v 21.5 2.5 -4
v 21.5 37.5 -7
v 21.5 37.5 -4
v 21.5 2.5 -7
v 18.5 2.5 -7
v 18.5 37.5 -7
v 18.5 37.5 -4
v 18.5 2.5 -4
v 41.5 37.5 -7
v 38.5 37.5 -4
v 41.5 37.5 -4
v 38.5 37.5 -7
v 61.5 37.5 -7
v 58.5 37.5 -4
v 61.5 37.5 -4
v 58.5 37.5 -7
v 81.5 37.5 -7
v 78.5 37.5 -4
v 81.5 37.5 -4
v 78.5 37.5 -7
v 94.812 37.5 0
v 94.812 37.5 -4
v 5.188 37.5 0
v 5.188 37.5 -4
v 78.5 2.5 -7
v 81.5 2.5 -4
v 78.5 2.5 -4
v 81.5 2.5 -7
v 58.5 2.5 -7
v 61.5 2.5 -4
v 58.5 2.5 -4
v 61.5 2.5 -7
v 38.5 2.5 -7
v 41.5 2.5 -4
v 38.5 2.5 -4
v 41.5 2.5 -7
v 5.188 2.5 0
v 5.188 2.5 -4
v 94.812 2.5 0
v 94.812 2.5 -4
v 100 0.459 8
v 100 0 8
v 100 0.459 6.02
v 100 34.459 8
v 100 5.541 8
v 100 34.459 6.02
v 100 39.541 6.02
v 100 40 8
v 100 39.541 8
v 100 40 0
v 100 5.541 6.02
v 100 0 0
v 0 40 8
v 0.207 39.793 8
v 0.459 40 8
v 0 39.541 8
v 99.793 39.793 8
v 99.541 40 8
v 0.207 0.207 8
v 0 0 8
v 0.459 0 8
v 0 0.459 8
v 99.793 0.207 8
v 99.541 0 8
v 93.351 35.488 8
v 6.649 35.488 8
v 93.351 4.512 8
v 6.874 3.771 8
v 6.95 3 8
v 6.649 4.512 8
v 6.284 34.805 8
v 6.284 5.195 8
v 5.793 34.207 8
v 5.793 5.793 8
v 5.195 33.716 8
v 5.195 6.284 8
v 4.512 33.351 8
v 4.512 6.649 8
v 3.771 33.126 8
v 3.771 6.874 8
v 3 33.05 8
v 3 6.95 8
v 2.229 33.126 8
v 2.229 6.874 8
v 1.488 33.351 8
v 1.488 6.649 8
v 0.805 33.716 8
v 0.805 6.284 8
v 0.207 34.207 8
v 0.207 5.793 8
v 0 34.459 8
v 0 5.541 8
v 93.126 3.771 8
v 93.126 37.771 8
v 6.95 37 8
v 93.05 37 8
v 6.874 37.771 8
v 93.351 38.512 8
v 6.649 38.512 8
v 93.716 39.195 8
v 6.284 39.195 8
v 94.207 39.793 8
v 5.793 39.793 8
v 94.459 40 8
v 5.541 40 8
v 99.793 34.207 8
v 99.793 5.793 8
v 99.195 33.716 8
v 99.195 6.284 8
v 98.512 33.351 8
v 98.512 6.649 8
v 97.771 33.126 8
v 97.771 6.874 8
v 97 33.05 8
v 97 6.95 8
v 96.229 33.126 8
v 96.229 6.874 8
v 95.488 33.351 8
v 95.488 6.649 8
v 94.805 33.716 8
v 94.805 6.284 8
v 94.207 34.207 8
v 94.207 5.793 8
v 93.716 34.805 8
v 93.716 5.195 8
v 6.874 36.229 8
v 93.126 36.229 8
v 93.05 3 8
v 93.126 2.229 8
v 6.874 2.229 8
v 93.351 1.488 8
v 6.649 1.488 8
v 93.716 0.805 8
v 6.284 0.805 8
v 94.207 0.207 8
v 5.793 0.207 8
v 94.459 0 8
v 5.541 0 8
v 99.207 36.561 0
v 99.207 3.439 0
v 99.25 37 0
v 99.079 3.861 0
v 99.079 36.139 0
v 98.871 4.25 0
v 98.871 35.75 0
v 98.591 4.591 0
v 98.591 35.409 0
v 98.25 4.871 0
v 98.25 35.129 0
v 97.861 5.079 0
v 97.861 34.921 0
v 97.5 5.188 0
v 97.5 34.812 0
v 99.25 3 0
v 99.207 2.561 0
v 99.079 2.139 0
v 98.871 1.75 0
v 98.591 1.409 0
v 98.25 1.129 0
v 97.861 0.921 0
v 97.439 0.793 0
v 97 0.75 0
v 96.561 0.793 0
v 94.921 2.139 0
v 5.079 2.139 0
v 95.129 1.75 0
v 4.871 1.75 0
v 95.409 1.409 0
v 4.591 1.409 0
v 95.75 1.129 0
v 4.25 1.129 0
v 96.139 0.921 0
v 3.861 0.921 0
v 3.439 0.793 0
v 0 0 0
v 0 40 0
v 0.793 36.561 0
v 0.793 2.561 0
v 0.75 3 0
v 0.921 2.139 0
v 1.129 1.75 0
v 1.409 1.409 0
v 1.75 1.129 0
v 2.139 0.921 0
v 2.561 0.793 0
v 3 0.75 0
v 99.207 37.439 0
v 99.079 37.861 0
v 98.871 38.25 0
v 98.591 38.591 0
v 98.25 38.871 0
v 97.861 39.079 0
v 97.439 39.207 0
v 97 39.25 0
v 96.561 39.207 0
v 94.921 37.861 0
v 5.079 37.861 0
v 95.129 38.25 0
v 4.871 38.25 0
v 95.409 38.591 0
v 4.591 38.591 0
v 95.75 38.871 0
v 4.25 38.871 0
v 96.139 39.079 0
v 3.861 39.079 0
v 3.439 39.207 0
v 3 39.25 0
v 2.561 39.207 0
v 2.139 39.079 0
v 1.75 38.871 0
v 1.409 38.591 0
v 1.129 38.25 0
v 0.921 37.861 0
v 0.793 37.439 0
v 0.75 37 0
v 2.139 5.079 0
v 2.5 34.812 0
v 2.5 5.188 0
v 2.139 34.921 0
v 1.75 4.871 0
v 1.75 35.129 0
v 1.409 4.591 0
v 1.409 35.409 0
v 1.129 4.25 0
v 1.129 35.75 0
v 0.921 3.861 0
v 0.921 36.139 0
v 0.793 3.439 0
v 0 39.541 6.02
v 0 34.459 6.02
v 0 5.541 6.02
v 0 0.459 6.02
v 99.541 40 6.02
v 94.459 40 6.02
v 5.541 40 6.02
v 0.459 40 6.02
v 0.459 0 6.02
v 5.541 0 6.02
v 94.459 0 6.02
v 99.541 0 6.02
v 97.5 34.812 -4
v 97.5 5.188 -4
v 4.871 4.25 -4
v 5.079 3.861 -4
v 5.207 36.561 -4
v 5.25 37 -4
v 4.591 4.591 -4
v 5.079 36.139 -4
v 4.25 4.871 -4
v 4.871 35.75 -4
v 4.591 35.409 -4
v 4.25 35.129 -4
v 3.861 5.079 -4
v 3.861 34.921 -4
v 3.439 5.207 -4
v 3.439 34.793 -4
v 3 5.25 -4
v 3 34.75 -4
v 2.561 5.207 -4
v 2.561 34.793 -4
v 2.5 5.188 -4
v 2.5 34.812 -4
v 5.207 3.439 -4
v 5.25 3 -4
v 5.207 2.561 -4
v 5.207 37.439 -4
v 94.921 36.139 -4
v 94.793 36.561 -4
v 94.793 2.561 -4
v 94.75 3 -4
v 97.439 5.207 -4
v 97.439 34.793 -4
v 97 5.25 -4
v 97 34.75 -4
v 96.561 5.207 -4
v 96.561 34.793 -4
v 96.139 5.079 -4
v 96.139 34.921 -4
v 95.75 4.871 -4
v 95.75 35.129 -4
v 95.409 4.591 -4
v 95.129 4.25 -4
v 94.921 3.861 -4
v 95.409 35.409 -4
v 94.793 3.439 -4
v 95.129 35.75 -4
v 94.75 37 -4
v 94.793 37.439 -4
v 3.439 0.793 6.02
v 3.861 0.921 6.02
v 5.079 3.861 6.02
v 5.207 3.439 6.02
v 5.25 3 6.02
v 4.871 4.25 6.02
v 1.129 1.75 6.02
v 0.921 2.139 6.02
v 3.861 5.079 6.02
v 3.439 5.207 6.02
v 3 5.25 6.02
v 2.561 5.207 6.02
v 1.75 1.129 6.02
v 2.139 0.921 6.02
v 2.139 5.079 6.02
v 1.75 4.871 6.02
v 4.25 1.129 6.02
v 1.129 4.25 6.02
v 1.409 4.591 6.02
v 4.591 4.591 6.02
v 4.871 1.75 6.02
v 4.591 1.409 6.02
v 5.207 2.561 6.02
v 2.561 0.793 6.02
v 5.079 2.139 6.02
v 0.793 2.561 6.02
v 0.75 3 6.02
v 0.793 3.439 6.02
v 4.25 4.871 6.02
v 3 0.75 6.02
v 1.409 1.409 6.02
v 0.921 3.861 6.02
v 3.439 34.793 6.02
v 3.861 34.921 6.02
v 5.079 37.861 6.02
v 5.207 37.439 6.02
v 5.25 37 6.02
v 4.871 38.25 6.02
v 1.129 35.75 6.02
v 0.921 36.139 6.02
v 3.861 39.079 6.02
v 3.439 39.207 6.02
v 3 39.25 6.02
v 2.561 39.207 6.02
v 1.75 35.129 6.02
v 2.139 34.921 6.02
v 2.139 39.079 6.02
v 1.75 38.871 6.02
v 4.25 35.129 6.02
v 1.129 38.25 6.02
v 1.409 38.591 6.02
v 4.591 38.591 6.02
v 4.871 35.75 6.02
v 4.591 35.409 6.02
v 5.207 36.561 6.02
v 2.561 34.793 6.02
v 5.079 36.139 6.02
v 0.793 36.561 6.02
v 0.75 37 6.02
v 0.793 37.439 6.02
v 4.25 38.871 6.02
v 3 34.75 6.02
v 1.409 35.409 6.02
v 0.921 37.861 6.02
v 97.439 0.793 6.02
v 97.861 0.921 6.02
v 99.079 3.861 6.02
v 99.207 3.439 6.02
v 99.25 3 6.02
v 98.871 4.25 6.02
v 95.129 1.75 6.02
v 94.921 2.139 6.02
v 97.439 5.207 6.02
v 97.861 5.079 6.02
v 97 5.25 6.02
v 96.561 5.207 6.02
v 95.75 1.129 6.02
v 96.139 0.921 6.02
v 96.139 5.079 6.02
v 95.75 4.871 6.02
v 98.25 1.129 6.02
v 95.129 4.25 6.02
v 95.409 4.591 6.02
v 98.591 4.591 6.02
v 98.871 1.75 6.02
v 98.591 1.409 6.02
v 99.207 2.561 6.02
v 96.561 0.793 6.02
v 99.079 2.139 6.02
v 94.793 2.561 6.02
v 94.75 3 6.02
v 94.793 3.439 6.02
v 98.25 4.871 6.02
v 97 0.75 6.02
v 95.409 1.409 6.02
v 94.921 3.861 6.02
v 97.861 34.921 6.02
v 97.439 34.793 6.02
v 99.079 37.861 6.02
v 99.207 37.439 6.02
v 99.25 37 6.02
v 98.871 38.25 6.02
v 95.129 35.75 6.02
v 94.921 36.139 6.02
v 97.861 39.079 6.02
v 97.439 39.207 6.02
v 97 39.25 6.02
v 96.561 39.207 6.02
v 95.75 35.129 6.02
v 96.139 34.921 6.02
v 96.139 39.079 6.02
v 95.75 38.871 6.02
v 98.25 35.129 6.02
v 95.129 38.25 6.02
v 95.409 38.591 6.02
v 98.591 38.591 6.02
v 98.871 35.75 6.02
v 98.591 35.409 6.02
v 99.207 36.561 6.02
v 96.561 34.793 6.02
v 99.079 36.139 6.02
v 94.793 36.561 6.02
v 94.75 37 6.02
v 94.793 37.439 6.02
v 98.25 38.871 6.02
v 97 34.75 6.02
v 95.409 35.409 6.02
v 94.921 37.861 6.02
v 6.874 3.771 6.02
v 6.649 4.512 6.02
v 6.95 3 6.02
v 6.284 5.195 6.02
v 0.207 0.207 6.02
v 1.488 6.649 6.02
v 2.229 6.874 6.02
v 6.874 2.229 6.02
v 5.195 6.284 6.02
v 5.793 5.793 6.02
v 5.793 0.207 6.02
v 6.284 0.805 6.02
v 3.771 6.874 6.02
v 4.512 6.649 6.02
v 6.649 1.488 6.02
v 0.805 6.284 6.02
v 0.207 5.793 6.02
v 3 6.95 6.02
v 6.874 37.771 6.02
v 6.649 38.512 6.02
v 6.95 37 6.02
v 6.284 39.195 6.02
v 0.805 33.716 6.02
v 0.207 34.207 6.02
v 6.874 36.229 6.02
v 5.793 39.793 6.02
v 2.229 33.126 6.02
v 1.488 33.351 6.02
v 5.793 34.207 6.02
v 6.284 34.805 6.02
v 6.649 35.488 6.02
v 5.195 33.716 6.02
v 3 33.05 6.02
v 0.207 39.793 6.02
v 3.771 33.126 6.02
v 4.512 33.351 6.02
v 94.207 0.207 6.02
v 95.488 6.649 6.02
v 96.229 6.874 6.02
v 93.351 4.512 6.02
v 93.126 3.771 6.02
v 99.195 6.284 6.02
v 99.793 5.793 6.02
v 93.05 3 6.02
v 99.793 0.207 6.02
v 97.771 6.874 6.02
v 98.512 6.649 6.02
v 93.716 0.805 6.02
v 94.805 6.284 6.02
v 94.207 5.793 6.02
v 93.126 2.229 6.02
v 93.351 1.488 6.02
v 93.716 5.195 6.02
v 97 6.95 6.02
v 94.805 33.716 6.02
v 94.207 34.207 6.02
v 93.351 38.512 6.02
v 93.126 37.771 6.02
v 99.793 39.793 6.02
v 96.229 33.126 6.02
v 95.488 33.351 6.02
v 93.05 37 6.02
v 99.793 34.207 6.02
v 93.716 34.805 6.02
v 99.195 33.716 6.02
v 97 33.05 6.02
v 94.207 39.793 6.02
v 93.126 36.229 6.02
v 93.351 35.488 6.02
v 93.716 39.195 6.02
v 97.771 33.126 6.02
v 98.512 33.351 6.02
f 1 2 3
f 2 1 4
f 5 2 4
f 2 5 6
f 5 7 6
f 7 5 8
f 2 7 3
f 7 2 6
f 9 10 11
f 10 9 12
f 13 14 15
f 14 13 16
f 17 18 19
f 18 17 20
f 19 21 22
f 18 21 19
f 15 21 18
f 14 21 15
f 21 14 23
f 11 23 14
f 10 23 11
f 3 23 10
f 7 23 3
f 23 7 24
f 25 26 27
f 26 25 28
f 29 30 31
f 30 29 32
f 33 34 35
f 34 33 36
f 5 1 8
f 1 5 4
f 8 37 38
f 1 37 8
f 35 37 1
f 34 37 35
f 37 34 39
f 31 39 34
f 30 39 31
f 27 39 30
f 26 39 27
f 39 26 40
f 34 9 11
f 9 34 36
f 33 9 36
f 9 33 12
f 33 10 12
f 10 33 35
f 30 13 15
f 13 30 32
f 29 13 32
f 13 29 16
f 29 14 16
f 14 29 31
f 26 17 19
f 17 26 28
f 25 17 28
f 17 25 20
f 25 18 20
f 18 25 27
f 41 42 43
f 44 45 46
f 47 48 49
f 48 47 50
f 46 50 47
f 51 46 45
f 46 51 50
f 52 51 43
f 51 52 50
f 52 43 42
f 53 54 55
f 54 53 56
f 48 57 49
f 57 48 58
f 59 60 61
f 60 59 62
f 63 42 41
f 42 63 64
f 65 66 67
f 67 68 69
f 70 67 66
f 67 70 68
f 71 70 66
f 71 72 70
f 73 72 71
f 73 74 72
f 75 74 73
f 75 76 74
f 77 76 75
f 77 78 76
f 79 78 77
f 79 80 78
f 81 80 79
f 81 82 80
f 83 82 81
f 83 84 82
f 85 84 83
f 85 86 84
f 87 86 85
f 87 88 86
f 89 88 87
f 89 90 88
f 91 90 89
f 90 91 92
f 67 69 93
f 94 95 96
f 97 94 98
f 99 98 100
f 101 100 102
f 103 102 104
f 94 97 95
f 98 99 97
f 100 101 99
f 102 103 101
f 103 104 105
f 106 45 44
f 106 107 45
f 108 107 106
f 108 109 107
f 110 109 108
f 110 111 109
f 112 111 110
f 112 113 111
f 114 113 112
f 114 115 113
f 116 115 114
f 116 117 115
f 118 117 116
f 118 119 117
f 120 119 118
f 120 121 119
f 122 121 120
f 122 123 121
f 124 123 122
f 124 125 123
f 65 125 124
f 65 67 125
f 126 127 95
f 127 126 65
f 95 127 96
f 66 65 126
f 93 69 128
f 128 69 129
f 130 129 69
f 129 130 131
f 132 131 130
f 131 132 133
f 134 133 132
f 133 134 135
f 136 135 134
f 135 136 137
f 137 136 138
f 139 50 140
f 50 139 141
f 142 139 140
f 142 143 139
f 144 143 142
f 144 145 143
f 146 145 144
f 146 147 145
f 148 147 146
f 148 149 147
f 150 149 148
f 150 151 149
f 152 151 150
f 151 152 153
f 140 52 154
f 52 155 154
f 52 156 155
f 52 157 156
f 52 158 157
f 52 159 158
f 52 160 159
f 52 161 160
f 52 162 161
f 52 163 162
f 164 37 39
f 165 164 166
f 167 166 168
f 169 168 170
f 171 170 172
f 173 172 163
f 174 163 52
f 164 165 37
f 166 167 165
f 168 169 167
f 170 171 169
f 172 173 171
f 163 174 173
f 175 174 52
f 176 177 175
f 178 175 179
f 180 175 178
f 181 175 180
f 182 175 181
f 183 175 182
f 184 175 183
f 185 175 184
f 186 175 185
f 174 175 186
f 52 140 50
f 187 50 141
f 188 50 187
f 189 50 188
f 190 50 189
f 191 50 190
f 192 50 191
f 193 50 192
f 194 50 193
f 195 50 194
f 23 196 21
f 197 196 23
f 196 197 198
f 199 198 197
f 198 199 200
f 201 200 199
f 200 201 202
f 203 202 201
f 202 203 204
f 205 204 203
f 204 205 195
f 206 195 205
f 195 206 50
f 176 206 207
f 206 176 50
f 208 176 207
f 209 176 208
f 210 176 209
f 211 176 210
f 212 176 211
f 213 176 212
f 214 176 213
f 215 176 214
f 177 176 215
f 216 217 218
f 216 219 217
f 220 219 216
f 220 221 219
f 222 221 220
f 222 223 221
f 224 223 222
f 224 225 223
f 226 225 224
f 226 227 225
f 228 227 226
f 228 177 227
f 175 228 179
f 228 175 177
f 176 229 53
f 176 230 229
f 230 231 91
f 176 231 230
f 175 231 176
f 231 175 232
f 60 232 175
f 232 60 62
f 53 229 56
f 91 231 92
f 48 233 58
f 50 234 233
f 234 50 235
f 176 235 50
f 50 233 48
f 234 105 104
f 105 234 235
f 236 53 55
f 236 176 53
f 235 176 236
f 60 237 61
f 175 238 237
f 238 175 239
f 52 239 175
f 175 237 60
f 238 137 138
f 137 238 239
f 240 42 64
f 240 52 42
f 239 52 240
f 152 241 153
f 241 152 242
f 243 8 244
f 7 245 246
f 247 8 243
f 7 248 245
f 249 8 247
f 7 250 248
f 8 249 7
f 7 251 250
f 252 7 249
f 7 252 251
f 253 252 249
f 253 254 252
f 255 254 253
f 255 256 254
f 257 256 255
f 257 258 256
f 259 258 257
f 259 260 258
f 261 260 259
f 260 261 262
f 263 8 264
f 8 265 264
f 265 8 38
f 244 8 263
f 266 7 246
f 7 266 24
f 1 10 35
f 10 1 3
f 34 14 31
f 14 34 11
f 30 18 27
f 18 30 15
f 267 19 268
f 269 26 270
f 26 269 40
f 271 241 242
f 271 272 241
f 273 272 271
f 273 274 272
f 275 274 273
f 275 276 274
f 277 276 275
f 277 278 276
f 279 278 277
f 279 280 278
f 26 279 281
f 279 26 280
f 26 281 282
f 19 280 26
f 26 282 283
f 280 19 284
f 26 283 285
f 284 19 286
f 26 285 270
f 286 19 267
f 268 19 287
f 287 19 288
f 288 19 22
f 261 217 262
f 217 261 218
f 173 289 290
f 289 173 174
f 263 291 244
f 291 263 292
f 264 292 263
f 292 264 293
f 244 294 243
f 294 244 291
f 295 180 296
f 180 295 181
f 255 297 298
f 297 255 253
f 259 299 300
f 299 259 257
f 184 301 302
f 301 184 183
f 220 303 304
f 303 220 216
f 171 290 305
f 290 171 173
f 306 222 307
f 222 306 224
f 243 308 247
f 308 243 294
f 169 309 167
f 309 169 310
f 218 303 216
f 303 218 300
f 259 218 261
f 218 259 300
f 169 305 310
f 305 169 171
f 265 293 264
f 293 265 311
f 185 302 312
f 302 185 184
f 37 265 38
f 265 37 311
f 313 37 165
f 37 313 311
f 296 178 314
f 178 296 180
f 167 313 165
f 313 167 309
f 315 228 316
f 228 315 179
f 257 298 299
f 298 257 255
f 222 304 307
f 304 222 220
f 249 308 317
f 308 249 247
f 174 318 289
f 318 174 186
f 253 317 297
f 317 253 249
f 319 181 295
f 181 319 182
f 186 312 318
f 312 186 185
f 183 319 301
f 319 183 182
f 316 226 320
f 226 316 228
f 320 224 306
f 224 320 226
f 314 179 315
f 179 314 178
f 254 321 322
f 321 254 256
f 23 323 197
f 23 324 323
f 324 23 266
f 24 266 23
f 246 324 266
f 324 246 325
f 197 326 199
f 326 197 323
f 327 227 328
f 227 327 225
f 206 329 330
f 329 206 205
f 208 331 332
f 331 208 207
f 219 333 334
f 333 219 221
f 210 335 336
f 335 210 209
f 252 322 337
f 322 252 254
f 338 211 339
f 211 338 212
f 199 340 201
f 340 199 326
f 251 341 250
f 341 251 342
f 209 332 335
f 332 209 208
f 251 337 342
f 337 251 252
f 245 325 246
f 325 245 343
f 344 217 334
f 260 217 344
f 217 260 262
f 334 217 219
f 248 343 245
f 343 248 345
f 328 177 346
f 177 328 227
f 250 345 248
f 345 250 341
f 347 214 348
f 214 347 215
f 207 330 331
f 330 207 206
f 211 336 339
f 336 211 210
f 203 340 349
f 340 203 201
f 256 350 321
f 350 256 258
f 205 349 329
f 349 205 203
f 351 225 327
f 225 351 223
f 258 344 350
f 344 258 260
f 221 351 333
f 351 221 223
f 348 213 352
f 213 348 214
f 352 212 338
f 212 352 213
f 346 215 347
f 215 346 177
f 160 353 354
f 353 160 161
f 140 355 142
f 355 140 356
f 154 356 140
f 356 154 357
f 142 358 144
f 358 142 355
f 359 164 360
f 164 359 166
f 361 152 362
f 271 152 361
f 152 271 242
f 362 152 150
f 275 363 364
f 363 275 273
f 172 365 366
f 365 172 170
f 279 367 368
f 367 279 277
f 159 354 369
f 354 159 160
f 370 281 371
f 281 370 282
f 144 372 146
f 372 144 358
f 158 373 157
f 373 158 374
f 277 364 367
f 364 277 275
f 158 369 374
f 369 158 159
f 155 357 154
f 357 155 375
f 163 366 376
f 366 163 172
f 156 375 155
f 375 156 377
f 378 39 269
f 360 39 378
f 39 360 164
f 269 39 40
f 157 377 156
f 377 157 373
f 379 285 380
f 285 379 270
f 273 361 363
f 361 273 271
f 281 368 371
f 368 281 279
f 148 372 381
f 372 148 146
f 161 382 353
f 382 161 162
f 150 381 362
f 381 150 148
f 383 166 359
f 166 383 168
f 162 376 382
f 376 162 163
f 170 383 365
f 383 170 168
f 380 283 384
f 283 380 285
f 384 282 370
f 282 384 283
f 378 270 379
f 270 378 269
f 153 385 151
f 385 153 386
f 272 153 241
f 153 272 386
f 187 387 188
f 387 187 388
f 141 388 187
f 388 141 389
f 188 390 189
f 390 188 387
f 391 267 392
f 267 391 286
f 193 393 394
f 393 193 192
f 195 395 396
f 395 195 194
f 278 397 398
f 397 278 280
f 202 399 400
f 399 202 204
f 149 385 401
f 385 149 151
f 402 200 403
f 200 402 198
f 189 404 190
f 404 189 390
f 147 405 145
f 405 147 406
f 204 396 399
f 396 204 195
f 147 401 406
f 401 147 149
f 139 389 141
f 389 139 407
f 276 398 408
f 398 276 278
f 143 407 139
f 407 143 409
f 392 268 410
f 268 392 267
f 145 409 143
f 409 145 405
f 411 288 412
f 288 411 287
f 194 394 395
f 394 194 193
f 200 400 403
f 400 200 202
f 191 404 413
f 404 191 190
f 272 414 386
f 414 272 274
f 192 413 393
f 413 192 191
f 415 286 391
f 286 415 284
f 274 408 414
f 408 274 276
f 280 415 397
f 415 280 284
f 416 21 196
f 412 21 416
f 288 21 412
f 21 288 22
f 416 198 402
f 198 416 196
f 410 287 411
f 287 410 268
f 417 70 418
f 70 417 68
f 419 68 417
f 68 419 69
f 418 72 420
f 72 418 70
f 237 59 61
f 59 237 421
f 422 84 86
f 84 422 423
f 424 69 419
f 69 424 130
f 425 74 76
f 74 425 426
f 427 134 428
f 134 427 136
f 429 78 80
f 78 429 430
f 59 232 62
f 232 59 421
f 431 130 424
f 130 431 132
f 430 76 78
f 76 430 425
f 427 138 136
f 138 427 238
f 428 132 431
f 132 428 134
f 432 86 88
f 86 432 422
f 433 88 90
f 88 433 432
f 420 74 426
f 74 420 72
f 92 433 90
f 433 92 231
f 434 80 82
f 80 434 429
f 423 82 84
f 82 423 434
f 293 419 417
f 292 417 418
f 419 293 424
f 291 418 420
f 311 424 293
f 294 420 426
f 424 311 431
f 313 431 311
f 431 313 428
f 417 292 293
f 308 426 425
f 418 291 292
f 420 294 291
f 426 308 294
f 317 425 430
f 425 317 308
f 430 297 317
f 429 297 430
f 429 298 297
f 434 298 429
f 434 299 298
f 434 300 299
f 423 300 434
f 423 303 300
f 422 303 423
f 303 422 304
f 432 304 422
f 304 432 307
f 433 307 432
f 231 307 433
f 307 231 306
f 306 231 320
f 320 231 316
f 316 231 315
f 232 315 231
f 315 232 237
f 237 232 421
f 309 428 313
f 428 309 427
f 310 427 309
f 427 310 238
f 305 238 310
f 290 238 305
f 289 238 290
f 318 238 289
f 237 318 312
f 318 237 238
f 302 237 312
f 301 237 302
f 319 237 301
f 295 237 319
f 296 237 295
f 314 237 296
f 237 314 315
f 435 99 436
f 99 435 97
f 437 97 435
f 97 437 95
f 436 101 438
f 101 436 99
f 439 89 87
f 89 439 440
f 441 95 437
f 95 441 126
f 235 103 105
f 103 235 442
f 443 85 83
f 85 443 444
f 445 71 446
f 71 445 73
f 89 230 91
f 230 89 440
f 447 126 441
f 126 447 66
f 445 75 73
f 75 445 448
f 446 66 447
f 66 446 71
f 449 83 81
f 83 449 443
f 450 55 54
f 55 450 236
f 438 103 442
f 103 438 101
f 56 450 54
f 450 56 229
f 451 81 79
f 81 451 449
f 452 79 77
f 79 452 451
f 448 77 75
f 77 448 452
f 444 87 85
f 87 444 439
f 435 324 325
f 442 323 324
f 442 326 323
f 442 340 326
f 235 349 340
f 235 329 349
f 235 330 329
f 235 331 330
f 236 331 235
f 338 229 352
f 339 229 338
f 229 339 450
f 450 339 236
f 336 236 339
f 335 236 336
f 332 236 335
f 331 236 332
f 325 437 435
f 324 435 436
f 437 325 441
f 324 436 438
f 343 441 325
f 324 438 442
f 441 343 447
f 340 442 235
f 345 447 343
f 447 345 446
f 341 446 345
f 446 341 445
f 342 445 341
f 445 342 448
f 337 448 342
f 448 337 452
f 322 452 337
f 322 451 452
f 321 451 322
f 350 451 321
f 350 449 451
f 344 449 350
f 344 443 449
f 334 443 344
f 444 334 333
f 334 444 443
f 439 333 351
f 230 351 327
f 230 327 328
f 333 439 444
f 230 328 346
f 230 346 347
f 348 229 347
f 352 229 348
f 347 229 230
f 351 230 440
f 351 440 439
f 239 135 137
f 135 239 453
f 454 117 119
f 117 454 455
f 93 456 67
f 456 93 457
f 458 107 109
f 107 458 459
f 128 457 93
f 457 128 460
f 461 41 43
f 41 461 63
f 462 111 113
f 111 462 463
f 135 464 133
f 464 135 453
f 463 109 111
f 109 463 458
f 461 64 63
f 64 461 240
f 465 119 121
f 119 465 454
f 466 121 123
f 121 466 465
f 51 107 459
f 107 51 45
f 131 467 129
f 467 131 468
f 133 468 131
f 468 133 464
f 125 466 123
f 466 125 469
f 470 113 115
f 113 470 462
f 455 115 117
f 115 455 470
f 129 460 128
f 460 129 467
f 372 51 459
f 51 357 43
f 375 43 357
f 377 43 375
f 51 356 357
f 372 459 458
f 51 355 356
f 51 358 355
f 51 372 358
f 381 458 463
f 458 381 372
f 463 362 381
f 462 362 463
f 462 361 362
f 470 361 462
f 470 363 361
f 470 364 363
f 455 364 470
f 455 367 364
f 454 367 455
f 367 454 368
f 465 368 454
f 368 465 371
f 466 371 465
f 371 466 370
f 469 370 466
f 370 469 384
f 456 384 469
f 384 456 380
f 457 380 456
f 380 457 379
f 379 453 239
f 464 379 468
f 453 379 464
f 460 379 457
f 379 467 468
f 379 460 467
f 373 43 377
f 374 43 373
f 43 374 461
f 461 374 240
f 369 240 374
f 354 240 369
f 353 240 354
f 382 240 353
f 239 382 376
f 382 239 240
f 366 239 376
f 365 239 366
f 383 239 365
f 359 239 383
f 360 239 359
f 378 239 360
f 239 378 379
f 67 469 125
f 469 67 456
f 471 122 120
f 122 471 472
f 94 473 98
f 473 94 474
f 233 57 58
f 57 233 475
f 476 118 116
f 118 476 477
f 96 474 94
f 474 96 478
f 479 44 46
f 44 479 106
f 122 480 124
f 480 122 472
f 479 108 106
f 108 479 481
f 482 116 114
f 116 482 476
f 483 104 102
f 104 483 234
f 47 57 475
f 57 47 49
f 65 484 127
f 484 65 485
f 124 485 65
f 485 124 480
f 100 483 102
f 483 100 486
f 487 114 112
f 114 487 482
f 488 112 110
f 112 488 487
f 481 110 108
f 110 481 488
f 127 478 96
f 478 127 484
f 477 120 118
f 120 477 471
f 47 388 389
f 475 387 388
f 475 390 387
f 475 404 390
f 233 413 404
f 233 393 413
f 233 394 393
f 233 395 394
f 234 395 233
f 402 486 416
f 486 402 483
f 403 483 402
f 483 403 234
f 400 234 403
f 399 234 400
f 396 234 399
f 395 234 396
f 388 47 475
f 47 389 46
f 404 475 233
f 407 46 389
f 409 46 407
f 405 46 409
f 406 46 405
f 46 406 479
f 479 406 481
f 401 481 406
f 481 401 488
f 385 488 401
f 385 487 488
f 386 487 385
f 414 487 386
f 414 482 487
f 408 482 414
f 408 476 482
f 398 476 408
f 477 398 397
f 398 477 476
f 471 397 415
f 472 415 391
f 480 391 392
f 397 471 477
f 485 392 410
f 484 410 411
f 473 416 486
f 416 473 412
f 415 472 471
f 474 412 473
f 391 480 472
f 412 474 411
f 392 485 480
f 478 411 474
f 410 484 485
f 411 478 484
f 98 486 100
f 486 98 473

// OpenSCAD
$fn = 32;

// ----------------------------------------------------------------------
// Enclosure lid: 100 x 40 x 8 mm, 4 bolt holes
// ----------------------------------------------------------------------

// --- parameters (mm) ---
length = 100;             // lid length, X
width = 40;               // lid width, Y
plate_t = 8;              // lid plate thickness
bolt_d = 4.5;             // bolt clearance
boss_lip = 3;             // bolt hole inset from the corner
sink = 1;                 // overlap of the lip and ribs into the plate
lip_h = 5;                // lip height below the plate
lip_wall = 2.5;           // lip wall thickness
cs_d = 7.9;               // countersink diameter
cs_h = 1.98;              // countersink depth
rib_n = 4;                // stiffening ribs
rib_t = 3;                // rib thickness
rib_h = 8;                // rib height below the plate

module plate() {
  cube([length, width, plate_t]);
  /* lip that drops into the housing opening, sunk into the plate */
  translate([lip_wall, lip_wall, -lip_h + sink]) cube([length - 2 * lip_wall, width - 2 * lip_wall, lip_h]);
  /* stiffening ribs under the plate */
  for (i = [1 : rib_n]) translate([length * i / (rib_n + 1) - rib_t / 2, lip_wall, -rib_h + sink]) cube([rib_t, width - 2 * lip_wall, rib_h]);
}

difference() {
  plate();
  /* bolt pattern matching the corner bosses */
  for (sx = [0, 1]) for (sy = [0, 1])
    translate([sx * (length - 2 * boss_lip) + boss_lip, sy * (width - 2 * boss_lip) + boss_lip, -lip_h - 1])
      cylinder(h = plate_t + lip_h + 2, d = bolt_d);
  /* countersinks so the heads sit flush */
  for (sx = [0, 1]) for (sy = [0, 1])
    translate([sx * (length - 2 * boss_lip) + boss_lip, sy * (width - 2 * boss_lip) + boss_lip, plate_t - cs_h])
      cylinder(h = cs_h + 0.5, d = cs_d);
}
